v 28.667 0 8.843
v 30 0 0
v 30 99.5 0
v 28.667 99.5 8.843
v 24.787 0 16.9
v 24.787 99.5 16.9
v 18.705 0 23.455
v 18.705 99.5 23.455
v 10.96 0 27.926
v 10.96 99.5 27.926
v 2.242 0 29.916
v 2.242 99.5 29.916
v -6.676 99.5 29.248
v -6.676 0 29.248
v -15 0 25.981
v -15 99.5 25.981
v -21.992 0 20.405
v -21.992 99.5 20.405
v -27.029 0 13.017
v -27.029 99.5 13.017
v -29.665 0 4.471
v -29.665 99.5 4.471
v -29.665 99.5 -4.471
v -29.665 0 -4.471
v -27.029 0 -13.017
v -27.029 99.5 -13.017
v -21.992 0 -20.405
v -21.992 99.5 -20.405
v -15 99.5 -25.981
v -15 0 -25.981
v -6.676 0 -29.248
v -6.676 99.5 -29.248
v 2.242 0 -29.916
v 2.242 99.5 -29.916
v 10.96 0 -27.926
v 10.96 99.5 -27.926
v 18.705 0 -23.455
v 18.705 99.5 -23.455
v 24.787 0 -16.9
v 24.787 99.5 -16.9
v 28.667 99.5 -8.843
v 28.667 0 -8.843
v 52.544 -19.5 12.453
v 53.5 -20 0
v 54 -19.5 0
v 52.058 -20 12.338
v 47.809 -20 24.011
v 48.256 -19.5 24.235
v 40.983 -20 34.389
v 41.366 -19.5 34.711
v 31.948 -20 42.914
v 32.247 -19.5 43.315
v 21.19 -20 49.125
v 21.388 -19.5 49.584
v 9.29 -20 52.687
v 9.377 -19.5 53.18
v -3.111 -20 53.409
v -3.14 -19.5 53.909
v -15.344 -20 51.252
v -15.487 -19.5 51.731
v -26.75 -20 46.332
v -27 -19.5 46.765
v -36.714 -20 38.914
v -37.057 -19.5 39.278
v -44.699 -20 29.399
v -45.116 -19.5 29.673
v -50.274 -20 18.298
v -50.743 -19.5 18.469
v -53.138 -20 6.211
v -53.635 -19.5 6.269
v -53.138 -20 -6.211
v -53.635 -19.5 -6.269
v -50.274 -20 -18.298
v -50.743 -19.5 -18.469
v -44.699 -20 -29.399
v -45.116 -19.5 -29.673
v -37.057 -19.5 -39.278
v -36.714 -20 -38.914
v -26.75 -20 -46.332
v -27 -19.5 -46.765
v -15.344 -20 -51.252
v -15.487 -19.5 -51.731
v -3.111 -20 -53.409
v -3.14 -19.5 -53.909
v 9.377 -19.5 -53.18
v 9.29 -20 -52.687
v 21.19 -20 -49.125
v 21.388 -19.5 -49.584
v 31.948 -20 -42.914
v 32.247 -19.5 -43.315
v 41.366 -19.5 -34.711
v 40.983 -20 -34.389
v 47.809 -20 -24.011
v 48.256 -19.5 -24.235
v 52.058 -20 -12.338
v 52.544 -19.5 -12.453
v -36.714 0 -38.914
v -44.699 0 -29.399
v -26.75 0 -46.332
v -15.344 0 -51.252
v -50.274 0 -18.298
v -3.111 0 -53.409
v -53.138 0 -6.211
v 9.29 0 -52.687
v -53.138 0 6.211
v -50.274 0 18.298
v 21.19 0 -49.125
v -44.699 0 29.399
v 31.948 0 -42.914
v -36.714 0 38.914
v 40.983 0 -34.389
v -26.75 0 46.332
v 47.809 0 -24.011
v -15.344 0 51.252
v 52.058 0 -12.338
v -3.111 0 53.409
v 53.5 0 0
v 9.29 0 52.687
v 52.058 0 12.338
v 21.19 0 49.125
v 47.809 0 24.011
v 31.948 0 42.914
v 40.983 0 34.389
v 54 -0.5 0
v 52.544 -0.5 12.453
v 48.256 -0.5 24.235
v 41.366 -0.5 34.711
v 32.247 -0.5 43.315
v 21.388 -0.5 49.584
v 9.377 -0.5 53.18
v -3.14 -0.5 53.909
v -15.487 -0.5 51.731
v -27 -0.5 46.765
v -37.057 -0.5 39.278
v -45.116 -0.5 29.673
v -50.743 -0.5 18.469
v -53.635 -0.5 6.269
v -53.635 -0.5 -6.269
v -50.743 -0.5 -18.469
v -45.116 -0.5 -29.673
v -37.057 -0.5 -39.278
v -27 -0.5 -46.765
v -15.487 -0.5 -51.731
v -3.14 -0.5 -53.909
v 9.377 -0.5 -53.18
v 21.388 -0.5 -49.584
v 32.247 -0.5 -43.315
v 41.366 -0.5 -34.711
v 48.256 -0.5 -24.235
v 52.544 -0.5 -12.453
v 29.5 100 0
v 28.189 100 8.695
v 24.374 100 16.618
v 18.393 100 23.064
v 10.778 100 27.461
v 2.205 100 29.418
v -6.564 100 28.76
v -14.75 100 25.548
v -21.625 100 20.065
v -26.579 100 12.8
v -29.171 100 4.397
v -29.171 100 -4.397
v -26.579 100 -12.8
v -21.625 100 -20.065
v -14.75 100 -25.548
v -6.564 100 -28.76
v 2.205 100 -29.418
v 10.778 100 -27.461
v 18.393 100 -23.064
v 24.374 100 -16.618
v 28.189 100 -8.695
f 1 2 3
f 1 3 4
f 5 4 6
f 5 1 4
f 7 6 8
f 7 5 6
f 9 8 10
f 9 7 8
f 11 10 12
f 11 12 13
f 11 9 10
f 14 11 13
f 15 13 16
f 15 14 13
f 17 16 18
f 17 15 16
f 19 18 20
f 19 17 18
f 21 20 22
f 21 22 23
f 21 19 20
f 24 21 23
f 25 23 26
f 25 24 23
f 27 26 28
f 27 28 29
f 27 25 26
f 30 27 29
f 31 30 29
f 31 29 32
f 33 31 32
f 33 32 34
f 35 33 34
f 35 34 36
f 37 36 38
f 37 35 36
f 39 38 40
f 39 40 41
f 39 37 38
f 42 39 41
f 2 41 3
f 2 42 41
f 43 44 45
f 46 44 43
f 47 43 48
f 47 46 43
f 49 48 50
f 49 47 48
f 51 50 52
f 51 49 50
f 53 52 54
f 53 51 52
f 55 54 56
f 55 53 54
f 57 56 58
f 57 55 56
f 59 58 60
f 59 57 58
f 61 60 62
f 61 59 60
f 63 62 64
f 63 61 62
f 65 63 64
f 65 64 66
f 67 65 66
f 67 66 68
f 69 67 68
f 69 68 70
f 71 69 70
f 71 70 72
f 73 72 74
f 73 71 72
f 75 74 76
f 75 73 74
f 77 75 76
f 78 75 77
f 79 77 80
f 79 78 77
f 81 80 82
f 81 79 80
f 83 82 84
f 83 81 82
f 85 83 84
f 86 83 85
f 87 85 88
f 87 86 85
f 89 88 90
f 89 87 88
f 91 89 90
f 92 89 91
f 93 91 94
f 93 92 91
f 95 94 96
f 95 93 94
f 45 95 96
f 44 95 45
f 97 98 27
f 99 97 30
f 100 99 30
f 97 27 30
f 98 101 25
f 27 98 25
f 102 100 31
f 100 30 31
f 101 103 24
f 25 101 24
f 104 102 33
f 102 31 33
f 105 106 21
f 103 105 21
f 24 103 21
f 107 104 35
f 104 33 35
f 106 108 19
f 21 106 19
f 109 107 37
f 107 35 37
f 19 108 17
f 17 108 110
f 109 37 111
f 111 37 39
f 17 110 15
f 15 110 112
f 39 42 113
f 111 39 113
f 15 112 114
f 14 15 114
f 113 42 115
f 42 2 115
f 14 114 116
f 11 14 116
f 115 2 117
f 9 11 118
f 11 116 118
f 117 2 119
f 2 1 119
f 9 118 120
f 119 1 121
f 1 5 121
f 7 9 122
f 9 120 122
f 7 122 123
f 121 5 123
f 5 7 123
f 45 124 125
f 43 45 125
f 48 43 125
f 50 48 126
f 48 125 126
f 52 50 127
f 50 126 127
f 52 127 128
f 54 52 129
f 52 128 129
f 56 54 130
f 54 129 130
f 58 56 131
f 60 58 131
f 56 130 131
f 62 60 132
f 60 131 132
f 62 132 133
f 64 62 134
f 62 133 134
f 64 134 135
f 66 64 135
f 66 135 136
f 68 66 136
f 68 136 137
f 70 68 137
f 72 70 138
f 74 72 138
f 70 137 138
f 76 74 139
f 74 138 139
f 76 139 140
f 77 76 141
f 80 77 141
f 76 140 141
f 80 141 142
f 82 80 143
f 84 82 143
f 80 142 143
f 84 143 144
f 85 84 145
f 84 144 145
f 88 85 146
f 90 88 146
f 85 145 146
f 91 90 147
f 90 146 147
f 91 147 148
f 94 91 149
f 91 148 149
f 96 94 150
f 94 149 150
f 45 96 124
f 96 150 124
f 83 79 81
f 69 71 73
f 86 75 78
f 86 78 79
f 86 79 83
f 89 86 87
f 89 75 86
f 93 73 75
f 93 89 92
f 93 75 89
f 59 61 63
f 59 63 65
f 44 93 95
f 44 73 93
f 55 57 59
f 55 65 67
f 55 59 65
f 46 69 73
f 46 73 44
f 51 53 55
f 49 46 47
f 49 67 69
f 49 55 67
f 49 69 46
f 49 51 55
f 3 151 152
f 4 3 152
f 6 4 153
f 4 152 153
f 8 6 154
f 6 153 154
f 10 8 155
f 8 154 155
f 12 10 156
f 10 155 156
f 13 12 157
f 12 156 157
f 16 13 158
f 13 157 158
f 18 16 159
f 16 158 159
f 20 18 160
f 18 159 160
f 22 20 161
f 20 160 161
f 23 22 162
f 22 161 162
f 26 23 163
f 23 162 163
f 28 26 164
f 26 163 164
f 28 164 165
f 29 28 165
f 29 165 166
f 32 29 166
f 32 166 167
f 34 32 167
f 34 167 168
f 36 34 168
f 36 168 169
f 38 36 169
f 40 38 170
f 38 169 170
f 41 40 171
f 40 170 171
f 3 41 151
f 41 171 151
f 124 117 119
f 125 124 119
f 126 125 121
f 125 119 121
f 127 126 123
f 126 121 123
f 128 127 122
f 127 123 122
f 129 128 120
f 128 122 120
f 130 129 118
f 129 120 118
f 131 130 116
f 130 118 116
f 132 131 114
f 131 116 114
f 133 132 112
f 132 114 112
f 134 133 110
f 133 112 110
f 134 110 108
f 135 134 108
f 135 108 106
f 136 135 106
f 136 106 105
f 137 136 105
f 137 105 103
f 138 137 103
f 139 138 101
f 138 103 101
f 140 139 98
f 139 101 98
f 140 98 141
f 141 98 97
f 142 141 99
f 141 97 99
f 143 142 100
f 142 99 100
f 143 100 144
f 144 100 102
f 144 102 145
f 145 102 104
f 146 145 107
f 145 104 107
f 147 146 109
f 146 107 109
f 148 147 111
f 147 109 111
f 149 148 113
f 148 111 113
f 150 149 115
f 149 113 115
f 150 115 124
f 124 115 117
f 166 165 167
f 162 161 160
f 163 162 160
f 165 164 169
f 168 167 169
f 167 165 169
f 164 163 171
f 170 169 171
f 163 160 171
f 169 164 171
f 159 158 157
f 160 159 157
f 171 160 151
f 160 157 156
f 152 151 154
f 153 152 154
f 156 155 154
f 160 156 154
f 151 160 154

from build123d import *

# Parameters (mm, degrees)
F0_R     = 54
F0_R_2   = 30
F1_DEPTH = 20
F2_DEPTH = 100
F3_SIZE  = 0.5


with BuildPart() as f1:
    # F0 (on Front) → F1 (new body)
    with BuildSketch(Plane.XZ):
        Circle(F0_R)
        Circle(F0_R_2, mode=Mode.SUBTRACT)
        Circle(F0_R_2)
    extrude(amount=F1_DEPTH)

    # F0 (on Front) → F2 (join)
    with BuildSketch(Plane.XZ):
        Circle(F0_R_2)
    extrude(amount=-F2_DEPTH)

    # F3
    f3_edges = [f1.edges().sort_by_distance(p)[0] for p in [
        (-54, -20, 0),
        (54, -10, 0),
        (-54, 0, 0),
        (-30, 100, 0),
    ]]
    chamfer(f3_edges, length=F3_SIZE)


solid = f1.part
